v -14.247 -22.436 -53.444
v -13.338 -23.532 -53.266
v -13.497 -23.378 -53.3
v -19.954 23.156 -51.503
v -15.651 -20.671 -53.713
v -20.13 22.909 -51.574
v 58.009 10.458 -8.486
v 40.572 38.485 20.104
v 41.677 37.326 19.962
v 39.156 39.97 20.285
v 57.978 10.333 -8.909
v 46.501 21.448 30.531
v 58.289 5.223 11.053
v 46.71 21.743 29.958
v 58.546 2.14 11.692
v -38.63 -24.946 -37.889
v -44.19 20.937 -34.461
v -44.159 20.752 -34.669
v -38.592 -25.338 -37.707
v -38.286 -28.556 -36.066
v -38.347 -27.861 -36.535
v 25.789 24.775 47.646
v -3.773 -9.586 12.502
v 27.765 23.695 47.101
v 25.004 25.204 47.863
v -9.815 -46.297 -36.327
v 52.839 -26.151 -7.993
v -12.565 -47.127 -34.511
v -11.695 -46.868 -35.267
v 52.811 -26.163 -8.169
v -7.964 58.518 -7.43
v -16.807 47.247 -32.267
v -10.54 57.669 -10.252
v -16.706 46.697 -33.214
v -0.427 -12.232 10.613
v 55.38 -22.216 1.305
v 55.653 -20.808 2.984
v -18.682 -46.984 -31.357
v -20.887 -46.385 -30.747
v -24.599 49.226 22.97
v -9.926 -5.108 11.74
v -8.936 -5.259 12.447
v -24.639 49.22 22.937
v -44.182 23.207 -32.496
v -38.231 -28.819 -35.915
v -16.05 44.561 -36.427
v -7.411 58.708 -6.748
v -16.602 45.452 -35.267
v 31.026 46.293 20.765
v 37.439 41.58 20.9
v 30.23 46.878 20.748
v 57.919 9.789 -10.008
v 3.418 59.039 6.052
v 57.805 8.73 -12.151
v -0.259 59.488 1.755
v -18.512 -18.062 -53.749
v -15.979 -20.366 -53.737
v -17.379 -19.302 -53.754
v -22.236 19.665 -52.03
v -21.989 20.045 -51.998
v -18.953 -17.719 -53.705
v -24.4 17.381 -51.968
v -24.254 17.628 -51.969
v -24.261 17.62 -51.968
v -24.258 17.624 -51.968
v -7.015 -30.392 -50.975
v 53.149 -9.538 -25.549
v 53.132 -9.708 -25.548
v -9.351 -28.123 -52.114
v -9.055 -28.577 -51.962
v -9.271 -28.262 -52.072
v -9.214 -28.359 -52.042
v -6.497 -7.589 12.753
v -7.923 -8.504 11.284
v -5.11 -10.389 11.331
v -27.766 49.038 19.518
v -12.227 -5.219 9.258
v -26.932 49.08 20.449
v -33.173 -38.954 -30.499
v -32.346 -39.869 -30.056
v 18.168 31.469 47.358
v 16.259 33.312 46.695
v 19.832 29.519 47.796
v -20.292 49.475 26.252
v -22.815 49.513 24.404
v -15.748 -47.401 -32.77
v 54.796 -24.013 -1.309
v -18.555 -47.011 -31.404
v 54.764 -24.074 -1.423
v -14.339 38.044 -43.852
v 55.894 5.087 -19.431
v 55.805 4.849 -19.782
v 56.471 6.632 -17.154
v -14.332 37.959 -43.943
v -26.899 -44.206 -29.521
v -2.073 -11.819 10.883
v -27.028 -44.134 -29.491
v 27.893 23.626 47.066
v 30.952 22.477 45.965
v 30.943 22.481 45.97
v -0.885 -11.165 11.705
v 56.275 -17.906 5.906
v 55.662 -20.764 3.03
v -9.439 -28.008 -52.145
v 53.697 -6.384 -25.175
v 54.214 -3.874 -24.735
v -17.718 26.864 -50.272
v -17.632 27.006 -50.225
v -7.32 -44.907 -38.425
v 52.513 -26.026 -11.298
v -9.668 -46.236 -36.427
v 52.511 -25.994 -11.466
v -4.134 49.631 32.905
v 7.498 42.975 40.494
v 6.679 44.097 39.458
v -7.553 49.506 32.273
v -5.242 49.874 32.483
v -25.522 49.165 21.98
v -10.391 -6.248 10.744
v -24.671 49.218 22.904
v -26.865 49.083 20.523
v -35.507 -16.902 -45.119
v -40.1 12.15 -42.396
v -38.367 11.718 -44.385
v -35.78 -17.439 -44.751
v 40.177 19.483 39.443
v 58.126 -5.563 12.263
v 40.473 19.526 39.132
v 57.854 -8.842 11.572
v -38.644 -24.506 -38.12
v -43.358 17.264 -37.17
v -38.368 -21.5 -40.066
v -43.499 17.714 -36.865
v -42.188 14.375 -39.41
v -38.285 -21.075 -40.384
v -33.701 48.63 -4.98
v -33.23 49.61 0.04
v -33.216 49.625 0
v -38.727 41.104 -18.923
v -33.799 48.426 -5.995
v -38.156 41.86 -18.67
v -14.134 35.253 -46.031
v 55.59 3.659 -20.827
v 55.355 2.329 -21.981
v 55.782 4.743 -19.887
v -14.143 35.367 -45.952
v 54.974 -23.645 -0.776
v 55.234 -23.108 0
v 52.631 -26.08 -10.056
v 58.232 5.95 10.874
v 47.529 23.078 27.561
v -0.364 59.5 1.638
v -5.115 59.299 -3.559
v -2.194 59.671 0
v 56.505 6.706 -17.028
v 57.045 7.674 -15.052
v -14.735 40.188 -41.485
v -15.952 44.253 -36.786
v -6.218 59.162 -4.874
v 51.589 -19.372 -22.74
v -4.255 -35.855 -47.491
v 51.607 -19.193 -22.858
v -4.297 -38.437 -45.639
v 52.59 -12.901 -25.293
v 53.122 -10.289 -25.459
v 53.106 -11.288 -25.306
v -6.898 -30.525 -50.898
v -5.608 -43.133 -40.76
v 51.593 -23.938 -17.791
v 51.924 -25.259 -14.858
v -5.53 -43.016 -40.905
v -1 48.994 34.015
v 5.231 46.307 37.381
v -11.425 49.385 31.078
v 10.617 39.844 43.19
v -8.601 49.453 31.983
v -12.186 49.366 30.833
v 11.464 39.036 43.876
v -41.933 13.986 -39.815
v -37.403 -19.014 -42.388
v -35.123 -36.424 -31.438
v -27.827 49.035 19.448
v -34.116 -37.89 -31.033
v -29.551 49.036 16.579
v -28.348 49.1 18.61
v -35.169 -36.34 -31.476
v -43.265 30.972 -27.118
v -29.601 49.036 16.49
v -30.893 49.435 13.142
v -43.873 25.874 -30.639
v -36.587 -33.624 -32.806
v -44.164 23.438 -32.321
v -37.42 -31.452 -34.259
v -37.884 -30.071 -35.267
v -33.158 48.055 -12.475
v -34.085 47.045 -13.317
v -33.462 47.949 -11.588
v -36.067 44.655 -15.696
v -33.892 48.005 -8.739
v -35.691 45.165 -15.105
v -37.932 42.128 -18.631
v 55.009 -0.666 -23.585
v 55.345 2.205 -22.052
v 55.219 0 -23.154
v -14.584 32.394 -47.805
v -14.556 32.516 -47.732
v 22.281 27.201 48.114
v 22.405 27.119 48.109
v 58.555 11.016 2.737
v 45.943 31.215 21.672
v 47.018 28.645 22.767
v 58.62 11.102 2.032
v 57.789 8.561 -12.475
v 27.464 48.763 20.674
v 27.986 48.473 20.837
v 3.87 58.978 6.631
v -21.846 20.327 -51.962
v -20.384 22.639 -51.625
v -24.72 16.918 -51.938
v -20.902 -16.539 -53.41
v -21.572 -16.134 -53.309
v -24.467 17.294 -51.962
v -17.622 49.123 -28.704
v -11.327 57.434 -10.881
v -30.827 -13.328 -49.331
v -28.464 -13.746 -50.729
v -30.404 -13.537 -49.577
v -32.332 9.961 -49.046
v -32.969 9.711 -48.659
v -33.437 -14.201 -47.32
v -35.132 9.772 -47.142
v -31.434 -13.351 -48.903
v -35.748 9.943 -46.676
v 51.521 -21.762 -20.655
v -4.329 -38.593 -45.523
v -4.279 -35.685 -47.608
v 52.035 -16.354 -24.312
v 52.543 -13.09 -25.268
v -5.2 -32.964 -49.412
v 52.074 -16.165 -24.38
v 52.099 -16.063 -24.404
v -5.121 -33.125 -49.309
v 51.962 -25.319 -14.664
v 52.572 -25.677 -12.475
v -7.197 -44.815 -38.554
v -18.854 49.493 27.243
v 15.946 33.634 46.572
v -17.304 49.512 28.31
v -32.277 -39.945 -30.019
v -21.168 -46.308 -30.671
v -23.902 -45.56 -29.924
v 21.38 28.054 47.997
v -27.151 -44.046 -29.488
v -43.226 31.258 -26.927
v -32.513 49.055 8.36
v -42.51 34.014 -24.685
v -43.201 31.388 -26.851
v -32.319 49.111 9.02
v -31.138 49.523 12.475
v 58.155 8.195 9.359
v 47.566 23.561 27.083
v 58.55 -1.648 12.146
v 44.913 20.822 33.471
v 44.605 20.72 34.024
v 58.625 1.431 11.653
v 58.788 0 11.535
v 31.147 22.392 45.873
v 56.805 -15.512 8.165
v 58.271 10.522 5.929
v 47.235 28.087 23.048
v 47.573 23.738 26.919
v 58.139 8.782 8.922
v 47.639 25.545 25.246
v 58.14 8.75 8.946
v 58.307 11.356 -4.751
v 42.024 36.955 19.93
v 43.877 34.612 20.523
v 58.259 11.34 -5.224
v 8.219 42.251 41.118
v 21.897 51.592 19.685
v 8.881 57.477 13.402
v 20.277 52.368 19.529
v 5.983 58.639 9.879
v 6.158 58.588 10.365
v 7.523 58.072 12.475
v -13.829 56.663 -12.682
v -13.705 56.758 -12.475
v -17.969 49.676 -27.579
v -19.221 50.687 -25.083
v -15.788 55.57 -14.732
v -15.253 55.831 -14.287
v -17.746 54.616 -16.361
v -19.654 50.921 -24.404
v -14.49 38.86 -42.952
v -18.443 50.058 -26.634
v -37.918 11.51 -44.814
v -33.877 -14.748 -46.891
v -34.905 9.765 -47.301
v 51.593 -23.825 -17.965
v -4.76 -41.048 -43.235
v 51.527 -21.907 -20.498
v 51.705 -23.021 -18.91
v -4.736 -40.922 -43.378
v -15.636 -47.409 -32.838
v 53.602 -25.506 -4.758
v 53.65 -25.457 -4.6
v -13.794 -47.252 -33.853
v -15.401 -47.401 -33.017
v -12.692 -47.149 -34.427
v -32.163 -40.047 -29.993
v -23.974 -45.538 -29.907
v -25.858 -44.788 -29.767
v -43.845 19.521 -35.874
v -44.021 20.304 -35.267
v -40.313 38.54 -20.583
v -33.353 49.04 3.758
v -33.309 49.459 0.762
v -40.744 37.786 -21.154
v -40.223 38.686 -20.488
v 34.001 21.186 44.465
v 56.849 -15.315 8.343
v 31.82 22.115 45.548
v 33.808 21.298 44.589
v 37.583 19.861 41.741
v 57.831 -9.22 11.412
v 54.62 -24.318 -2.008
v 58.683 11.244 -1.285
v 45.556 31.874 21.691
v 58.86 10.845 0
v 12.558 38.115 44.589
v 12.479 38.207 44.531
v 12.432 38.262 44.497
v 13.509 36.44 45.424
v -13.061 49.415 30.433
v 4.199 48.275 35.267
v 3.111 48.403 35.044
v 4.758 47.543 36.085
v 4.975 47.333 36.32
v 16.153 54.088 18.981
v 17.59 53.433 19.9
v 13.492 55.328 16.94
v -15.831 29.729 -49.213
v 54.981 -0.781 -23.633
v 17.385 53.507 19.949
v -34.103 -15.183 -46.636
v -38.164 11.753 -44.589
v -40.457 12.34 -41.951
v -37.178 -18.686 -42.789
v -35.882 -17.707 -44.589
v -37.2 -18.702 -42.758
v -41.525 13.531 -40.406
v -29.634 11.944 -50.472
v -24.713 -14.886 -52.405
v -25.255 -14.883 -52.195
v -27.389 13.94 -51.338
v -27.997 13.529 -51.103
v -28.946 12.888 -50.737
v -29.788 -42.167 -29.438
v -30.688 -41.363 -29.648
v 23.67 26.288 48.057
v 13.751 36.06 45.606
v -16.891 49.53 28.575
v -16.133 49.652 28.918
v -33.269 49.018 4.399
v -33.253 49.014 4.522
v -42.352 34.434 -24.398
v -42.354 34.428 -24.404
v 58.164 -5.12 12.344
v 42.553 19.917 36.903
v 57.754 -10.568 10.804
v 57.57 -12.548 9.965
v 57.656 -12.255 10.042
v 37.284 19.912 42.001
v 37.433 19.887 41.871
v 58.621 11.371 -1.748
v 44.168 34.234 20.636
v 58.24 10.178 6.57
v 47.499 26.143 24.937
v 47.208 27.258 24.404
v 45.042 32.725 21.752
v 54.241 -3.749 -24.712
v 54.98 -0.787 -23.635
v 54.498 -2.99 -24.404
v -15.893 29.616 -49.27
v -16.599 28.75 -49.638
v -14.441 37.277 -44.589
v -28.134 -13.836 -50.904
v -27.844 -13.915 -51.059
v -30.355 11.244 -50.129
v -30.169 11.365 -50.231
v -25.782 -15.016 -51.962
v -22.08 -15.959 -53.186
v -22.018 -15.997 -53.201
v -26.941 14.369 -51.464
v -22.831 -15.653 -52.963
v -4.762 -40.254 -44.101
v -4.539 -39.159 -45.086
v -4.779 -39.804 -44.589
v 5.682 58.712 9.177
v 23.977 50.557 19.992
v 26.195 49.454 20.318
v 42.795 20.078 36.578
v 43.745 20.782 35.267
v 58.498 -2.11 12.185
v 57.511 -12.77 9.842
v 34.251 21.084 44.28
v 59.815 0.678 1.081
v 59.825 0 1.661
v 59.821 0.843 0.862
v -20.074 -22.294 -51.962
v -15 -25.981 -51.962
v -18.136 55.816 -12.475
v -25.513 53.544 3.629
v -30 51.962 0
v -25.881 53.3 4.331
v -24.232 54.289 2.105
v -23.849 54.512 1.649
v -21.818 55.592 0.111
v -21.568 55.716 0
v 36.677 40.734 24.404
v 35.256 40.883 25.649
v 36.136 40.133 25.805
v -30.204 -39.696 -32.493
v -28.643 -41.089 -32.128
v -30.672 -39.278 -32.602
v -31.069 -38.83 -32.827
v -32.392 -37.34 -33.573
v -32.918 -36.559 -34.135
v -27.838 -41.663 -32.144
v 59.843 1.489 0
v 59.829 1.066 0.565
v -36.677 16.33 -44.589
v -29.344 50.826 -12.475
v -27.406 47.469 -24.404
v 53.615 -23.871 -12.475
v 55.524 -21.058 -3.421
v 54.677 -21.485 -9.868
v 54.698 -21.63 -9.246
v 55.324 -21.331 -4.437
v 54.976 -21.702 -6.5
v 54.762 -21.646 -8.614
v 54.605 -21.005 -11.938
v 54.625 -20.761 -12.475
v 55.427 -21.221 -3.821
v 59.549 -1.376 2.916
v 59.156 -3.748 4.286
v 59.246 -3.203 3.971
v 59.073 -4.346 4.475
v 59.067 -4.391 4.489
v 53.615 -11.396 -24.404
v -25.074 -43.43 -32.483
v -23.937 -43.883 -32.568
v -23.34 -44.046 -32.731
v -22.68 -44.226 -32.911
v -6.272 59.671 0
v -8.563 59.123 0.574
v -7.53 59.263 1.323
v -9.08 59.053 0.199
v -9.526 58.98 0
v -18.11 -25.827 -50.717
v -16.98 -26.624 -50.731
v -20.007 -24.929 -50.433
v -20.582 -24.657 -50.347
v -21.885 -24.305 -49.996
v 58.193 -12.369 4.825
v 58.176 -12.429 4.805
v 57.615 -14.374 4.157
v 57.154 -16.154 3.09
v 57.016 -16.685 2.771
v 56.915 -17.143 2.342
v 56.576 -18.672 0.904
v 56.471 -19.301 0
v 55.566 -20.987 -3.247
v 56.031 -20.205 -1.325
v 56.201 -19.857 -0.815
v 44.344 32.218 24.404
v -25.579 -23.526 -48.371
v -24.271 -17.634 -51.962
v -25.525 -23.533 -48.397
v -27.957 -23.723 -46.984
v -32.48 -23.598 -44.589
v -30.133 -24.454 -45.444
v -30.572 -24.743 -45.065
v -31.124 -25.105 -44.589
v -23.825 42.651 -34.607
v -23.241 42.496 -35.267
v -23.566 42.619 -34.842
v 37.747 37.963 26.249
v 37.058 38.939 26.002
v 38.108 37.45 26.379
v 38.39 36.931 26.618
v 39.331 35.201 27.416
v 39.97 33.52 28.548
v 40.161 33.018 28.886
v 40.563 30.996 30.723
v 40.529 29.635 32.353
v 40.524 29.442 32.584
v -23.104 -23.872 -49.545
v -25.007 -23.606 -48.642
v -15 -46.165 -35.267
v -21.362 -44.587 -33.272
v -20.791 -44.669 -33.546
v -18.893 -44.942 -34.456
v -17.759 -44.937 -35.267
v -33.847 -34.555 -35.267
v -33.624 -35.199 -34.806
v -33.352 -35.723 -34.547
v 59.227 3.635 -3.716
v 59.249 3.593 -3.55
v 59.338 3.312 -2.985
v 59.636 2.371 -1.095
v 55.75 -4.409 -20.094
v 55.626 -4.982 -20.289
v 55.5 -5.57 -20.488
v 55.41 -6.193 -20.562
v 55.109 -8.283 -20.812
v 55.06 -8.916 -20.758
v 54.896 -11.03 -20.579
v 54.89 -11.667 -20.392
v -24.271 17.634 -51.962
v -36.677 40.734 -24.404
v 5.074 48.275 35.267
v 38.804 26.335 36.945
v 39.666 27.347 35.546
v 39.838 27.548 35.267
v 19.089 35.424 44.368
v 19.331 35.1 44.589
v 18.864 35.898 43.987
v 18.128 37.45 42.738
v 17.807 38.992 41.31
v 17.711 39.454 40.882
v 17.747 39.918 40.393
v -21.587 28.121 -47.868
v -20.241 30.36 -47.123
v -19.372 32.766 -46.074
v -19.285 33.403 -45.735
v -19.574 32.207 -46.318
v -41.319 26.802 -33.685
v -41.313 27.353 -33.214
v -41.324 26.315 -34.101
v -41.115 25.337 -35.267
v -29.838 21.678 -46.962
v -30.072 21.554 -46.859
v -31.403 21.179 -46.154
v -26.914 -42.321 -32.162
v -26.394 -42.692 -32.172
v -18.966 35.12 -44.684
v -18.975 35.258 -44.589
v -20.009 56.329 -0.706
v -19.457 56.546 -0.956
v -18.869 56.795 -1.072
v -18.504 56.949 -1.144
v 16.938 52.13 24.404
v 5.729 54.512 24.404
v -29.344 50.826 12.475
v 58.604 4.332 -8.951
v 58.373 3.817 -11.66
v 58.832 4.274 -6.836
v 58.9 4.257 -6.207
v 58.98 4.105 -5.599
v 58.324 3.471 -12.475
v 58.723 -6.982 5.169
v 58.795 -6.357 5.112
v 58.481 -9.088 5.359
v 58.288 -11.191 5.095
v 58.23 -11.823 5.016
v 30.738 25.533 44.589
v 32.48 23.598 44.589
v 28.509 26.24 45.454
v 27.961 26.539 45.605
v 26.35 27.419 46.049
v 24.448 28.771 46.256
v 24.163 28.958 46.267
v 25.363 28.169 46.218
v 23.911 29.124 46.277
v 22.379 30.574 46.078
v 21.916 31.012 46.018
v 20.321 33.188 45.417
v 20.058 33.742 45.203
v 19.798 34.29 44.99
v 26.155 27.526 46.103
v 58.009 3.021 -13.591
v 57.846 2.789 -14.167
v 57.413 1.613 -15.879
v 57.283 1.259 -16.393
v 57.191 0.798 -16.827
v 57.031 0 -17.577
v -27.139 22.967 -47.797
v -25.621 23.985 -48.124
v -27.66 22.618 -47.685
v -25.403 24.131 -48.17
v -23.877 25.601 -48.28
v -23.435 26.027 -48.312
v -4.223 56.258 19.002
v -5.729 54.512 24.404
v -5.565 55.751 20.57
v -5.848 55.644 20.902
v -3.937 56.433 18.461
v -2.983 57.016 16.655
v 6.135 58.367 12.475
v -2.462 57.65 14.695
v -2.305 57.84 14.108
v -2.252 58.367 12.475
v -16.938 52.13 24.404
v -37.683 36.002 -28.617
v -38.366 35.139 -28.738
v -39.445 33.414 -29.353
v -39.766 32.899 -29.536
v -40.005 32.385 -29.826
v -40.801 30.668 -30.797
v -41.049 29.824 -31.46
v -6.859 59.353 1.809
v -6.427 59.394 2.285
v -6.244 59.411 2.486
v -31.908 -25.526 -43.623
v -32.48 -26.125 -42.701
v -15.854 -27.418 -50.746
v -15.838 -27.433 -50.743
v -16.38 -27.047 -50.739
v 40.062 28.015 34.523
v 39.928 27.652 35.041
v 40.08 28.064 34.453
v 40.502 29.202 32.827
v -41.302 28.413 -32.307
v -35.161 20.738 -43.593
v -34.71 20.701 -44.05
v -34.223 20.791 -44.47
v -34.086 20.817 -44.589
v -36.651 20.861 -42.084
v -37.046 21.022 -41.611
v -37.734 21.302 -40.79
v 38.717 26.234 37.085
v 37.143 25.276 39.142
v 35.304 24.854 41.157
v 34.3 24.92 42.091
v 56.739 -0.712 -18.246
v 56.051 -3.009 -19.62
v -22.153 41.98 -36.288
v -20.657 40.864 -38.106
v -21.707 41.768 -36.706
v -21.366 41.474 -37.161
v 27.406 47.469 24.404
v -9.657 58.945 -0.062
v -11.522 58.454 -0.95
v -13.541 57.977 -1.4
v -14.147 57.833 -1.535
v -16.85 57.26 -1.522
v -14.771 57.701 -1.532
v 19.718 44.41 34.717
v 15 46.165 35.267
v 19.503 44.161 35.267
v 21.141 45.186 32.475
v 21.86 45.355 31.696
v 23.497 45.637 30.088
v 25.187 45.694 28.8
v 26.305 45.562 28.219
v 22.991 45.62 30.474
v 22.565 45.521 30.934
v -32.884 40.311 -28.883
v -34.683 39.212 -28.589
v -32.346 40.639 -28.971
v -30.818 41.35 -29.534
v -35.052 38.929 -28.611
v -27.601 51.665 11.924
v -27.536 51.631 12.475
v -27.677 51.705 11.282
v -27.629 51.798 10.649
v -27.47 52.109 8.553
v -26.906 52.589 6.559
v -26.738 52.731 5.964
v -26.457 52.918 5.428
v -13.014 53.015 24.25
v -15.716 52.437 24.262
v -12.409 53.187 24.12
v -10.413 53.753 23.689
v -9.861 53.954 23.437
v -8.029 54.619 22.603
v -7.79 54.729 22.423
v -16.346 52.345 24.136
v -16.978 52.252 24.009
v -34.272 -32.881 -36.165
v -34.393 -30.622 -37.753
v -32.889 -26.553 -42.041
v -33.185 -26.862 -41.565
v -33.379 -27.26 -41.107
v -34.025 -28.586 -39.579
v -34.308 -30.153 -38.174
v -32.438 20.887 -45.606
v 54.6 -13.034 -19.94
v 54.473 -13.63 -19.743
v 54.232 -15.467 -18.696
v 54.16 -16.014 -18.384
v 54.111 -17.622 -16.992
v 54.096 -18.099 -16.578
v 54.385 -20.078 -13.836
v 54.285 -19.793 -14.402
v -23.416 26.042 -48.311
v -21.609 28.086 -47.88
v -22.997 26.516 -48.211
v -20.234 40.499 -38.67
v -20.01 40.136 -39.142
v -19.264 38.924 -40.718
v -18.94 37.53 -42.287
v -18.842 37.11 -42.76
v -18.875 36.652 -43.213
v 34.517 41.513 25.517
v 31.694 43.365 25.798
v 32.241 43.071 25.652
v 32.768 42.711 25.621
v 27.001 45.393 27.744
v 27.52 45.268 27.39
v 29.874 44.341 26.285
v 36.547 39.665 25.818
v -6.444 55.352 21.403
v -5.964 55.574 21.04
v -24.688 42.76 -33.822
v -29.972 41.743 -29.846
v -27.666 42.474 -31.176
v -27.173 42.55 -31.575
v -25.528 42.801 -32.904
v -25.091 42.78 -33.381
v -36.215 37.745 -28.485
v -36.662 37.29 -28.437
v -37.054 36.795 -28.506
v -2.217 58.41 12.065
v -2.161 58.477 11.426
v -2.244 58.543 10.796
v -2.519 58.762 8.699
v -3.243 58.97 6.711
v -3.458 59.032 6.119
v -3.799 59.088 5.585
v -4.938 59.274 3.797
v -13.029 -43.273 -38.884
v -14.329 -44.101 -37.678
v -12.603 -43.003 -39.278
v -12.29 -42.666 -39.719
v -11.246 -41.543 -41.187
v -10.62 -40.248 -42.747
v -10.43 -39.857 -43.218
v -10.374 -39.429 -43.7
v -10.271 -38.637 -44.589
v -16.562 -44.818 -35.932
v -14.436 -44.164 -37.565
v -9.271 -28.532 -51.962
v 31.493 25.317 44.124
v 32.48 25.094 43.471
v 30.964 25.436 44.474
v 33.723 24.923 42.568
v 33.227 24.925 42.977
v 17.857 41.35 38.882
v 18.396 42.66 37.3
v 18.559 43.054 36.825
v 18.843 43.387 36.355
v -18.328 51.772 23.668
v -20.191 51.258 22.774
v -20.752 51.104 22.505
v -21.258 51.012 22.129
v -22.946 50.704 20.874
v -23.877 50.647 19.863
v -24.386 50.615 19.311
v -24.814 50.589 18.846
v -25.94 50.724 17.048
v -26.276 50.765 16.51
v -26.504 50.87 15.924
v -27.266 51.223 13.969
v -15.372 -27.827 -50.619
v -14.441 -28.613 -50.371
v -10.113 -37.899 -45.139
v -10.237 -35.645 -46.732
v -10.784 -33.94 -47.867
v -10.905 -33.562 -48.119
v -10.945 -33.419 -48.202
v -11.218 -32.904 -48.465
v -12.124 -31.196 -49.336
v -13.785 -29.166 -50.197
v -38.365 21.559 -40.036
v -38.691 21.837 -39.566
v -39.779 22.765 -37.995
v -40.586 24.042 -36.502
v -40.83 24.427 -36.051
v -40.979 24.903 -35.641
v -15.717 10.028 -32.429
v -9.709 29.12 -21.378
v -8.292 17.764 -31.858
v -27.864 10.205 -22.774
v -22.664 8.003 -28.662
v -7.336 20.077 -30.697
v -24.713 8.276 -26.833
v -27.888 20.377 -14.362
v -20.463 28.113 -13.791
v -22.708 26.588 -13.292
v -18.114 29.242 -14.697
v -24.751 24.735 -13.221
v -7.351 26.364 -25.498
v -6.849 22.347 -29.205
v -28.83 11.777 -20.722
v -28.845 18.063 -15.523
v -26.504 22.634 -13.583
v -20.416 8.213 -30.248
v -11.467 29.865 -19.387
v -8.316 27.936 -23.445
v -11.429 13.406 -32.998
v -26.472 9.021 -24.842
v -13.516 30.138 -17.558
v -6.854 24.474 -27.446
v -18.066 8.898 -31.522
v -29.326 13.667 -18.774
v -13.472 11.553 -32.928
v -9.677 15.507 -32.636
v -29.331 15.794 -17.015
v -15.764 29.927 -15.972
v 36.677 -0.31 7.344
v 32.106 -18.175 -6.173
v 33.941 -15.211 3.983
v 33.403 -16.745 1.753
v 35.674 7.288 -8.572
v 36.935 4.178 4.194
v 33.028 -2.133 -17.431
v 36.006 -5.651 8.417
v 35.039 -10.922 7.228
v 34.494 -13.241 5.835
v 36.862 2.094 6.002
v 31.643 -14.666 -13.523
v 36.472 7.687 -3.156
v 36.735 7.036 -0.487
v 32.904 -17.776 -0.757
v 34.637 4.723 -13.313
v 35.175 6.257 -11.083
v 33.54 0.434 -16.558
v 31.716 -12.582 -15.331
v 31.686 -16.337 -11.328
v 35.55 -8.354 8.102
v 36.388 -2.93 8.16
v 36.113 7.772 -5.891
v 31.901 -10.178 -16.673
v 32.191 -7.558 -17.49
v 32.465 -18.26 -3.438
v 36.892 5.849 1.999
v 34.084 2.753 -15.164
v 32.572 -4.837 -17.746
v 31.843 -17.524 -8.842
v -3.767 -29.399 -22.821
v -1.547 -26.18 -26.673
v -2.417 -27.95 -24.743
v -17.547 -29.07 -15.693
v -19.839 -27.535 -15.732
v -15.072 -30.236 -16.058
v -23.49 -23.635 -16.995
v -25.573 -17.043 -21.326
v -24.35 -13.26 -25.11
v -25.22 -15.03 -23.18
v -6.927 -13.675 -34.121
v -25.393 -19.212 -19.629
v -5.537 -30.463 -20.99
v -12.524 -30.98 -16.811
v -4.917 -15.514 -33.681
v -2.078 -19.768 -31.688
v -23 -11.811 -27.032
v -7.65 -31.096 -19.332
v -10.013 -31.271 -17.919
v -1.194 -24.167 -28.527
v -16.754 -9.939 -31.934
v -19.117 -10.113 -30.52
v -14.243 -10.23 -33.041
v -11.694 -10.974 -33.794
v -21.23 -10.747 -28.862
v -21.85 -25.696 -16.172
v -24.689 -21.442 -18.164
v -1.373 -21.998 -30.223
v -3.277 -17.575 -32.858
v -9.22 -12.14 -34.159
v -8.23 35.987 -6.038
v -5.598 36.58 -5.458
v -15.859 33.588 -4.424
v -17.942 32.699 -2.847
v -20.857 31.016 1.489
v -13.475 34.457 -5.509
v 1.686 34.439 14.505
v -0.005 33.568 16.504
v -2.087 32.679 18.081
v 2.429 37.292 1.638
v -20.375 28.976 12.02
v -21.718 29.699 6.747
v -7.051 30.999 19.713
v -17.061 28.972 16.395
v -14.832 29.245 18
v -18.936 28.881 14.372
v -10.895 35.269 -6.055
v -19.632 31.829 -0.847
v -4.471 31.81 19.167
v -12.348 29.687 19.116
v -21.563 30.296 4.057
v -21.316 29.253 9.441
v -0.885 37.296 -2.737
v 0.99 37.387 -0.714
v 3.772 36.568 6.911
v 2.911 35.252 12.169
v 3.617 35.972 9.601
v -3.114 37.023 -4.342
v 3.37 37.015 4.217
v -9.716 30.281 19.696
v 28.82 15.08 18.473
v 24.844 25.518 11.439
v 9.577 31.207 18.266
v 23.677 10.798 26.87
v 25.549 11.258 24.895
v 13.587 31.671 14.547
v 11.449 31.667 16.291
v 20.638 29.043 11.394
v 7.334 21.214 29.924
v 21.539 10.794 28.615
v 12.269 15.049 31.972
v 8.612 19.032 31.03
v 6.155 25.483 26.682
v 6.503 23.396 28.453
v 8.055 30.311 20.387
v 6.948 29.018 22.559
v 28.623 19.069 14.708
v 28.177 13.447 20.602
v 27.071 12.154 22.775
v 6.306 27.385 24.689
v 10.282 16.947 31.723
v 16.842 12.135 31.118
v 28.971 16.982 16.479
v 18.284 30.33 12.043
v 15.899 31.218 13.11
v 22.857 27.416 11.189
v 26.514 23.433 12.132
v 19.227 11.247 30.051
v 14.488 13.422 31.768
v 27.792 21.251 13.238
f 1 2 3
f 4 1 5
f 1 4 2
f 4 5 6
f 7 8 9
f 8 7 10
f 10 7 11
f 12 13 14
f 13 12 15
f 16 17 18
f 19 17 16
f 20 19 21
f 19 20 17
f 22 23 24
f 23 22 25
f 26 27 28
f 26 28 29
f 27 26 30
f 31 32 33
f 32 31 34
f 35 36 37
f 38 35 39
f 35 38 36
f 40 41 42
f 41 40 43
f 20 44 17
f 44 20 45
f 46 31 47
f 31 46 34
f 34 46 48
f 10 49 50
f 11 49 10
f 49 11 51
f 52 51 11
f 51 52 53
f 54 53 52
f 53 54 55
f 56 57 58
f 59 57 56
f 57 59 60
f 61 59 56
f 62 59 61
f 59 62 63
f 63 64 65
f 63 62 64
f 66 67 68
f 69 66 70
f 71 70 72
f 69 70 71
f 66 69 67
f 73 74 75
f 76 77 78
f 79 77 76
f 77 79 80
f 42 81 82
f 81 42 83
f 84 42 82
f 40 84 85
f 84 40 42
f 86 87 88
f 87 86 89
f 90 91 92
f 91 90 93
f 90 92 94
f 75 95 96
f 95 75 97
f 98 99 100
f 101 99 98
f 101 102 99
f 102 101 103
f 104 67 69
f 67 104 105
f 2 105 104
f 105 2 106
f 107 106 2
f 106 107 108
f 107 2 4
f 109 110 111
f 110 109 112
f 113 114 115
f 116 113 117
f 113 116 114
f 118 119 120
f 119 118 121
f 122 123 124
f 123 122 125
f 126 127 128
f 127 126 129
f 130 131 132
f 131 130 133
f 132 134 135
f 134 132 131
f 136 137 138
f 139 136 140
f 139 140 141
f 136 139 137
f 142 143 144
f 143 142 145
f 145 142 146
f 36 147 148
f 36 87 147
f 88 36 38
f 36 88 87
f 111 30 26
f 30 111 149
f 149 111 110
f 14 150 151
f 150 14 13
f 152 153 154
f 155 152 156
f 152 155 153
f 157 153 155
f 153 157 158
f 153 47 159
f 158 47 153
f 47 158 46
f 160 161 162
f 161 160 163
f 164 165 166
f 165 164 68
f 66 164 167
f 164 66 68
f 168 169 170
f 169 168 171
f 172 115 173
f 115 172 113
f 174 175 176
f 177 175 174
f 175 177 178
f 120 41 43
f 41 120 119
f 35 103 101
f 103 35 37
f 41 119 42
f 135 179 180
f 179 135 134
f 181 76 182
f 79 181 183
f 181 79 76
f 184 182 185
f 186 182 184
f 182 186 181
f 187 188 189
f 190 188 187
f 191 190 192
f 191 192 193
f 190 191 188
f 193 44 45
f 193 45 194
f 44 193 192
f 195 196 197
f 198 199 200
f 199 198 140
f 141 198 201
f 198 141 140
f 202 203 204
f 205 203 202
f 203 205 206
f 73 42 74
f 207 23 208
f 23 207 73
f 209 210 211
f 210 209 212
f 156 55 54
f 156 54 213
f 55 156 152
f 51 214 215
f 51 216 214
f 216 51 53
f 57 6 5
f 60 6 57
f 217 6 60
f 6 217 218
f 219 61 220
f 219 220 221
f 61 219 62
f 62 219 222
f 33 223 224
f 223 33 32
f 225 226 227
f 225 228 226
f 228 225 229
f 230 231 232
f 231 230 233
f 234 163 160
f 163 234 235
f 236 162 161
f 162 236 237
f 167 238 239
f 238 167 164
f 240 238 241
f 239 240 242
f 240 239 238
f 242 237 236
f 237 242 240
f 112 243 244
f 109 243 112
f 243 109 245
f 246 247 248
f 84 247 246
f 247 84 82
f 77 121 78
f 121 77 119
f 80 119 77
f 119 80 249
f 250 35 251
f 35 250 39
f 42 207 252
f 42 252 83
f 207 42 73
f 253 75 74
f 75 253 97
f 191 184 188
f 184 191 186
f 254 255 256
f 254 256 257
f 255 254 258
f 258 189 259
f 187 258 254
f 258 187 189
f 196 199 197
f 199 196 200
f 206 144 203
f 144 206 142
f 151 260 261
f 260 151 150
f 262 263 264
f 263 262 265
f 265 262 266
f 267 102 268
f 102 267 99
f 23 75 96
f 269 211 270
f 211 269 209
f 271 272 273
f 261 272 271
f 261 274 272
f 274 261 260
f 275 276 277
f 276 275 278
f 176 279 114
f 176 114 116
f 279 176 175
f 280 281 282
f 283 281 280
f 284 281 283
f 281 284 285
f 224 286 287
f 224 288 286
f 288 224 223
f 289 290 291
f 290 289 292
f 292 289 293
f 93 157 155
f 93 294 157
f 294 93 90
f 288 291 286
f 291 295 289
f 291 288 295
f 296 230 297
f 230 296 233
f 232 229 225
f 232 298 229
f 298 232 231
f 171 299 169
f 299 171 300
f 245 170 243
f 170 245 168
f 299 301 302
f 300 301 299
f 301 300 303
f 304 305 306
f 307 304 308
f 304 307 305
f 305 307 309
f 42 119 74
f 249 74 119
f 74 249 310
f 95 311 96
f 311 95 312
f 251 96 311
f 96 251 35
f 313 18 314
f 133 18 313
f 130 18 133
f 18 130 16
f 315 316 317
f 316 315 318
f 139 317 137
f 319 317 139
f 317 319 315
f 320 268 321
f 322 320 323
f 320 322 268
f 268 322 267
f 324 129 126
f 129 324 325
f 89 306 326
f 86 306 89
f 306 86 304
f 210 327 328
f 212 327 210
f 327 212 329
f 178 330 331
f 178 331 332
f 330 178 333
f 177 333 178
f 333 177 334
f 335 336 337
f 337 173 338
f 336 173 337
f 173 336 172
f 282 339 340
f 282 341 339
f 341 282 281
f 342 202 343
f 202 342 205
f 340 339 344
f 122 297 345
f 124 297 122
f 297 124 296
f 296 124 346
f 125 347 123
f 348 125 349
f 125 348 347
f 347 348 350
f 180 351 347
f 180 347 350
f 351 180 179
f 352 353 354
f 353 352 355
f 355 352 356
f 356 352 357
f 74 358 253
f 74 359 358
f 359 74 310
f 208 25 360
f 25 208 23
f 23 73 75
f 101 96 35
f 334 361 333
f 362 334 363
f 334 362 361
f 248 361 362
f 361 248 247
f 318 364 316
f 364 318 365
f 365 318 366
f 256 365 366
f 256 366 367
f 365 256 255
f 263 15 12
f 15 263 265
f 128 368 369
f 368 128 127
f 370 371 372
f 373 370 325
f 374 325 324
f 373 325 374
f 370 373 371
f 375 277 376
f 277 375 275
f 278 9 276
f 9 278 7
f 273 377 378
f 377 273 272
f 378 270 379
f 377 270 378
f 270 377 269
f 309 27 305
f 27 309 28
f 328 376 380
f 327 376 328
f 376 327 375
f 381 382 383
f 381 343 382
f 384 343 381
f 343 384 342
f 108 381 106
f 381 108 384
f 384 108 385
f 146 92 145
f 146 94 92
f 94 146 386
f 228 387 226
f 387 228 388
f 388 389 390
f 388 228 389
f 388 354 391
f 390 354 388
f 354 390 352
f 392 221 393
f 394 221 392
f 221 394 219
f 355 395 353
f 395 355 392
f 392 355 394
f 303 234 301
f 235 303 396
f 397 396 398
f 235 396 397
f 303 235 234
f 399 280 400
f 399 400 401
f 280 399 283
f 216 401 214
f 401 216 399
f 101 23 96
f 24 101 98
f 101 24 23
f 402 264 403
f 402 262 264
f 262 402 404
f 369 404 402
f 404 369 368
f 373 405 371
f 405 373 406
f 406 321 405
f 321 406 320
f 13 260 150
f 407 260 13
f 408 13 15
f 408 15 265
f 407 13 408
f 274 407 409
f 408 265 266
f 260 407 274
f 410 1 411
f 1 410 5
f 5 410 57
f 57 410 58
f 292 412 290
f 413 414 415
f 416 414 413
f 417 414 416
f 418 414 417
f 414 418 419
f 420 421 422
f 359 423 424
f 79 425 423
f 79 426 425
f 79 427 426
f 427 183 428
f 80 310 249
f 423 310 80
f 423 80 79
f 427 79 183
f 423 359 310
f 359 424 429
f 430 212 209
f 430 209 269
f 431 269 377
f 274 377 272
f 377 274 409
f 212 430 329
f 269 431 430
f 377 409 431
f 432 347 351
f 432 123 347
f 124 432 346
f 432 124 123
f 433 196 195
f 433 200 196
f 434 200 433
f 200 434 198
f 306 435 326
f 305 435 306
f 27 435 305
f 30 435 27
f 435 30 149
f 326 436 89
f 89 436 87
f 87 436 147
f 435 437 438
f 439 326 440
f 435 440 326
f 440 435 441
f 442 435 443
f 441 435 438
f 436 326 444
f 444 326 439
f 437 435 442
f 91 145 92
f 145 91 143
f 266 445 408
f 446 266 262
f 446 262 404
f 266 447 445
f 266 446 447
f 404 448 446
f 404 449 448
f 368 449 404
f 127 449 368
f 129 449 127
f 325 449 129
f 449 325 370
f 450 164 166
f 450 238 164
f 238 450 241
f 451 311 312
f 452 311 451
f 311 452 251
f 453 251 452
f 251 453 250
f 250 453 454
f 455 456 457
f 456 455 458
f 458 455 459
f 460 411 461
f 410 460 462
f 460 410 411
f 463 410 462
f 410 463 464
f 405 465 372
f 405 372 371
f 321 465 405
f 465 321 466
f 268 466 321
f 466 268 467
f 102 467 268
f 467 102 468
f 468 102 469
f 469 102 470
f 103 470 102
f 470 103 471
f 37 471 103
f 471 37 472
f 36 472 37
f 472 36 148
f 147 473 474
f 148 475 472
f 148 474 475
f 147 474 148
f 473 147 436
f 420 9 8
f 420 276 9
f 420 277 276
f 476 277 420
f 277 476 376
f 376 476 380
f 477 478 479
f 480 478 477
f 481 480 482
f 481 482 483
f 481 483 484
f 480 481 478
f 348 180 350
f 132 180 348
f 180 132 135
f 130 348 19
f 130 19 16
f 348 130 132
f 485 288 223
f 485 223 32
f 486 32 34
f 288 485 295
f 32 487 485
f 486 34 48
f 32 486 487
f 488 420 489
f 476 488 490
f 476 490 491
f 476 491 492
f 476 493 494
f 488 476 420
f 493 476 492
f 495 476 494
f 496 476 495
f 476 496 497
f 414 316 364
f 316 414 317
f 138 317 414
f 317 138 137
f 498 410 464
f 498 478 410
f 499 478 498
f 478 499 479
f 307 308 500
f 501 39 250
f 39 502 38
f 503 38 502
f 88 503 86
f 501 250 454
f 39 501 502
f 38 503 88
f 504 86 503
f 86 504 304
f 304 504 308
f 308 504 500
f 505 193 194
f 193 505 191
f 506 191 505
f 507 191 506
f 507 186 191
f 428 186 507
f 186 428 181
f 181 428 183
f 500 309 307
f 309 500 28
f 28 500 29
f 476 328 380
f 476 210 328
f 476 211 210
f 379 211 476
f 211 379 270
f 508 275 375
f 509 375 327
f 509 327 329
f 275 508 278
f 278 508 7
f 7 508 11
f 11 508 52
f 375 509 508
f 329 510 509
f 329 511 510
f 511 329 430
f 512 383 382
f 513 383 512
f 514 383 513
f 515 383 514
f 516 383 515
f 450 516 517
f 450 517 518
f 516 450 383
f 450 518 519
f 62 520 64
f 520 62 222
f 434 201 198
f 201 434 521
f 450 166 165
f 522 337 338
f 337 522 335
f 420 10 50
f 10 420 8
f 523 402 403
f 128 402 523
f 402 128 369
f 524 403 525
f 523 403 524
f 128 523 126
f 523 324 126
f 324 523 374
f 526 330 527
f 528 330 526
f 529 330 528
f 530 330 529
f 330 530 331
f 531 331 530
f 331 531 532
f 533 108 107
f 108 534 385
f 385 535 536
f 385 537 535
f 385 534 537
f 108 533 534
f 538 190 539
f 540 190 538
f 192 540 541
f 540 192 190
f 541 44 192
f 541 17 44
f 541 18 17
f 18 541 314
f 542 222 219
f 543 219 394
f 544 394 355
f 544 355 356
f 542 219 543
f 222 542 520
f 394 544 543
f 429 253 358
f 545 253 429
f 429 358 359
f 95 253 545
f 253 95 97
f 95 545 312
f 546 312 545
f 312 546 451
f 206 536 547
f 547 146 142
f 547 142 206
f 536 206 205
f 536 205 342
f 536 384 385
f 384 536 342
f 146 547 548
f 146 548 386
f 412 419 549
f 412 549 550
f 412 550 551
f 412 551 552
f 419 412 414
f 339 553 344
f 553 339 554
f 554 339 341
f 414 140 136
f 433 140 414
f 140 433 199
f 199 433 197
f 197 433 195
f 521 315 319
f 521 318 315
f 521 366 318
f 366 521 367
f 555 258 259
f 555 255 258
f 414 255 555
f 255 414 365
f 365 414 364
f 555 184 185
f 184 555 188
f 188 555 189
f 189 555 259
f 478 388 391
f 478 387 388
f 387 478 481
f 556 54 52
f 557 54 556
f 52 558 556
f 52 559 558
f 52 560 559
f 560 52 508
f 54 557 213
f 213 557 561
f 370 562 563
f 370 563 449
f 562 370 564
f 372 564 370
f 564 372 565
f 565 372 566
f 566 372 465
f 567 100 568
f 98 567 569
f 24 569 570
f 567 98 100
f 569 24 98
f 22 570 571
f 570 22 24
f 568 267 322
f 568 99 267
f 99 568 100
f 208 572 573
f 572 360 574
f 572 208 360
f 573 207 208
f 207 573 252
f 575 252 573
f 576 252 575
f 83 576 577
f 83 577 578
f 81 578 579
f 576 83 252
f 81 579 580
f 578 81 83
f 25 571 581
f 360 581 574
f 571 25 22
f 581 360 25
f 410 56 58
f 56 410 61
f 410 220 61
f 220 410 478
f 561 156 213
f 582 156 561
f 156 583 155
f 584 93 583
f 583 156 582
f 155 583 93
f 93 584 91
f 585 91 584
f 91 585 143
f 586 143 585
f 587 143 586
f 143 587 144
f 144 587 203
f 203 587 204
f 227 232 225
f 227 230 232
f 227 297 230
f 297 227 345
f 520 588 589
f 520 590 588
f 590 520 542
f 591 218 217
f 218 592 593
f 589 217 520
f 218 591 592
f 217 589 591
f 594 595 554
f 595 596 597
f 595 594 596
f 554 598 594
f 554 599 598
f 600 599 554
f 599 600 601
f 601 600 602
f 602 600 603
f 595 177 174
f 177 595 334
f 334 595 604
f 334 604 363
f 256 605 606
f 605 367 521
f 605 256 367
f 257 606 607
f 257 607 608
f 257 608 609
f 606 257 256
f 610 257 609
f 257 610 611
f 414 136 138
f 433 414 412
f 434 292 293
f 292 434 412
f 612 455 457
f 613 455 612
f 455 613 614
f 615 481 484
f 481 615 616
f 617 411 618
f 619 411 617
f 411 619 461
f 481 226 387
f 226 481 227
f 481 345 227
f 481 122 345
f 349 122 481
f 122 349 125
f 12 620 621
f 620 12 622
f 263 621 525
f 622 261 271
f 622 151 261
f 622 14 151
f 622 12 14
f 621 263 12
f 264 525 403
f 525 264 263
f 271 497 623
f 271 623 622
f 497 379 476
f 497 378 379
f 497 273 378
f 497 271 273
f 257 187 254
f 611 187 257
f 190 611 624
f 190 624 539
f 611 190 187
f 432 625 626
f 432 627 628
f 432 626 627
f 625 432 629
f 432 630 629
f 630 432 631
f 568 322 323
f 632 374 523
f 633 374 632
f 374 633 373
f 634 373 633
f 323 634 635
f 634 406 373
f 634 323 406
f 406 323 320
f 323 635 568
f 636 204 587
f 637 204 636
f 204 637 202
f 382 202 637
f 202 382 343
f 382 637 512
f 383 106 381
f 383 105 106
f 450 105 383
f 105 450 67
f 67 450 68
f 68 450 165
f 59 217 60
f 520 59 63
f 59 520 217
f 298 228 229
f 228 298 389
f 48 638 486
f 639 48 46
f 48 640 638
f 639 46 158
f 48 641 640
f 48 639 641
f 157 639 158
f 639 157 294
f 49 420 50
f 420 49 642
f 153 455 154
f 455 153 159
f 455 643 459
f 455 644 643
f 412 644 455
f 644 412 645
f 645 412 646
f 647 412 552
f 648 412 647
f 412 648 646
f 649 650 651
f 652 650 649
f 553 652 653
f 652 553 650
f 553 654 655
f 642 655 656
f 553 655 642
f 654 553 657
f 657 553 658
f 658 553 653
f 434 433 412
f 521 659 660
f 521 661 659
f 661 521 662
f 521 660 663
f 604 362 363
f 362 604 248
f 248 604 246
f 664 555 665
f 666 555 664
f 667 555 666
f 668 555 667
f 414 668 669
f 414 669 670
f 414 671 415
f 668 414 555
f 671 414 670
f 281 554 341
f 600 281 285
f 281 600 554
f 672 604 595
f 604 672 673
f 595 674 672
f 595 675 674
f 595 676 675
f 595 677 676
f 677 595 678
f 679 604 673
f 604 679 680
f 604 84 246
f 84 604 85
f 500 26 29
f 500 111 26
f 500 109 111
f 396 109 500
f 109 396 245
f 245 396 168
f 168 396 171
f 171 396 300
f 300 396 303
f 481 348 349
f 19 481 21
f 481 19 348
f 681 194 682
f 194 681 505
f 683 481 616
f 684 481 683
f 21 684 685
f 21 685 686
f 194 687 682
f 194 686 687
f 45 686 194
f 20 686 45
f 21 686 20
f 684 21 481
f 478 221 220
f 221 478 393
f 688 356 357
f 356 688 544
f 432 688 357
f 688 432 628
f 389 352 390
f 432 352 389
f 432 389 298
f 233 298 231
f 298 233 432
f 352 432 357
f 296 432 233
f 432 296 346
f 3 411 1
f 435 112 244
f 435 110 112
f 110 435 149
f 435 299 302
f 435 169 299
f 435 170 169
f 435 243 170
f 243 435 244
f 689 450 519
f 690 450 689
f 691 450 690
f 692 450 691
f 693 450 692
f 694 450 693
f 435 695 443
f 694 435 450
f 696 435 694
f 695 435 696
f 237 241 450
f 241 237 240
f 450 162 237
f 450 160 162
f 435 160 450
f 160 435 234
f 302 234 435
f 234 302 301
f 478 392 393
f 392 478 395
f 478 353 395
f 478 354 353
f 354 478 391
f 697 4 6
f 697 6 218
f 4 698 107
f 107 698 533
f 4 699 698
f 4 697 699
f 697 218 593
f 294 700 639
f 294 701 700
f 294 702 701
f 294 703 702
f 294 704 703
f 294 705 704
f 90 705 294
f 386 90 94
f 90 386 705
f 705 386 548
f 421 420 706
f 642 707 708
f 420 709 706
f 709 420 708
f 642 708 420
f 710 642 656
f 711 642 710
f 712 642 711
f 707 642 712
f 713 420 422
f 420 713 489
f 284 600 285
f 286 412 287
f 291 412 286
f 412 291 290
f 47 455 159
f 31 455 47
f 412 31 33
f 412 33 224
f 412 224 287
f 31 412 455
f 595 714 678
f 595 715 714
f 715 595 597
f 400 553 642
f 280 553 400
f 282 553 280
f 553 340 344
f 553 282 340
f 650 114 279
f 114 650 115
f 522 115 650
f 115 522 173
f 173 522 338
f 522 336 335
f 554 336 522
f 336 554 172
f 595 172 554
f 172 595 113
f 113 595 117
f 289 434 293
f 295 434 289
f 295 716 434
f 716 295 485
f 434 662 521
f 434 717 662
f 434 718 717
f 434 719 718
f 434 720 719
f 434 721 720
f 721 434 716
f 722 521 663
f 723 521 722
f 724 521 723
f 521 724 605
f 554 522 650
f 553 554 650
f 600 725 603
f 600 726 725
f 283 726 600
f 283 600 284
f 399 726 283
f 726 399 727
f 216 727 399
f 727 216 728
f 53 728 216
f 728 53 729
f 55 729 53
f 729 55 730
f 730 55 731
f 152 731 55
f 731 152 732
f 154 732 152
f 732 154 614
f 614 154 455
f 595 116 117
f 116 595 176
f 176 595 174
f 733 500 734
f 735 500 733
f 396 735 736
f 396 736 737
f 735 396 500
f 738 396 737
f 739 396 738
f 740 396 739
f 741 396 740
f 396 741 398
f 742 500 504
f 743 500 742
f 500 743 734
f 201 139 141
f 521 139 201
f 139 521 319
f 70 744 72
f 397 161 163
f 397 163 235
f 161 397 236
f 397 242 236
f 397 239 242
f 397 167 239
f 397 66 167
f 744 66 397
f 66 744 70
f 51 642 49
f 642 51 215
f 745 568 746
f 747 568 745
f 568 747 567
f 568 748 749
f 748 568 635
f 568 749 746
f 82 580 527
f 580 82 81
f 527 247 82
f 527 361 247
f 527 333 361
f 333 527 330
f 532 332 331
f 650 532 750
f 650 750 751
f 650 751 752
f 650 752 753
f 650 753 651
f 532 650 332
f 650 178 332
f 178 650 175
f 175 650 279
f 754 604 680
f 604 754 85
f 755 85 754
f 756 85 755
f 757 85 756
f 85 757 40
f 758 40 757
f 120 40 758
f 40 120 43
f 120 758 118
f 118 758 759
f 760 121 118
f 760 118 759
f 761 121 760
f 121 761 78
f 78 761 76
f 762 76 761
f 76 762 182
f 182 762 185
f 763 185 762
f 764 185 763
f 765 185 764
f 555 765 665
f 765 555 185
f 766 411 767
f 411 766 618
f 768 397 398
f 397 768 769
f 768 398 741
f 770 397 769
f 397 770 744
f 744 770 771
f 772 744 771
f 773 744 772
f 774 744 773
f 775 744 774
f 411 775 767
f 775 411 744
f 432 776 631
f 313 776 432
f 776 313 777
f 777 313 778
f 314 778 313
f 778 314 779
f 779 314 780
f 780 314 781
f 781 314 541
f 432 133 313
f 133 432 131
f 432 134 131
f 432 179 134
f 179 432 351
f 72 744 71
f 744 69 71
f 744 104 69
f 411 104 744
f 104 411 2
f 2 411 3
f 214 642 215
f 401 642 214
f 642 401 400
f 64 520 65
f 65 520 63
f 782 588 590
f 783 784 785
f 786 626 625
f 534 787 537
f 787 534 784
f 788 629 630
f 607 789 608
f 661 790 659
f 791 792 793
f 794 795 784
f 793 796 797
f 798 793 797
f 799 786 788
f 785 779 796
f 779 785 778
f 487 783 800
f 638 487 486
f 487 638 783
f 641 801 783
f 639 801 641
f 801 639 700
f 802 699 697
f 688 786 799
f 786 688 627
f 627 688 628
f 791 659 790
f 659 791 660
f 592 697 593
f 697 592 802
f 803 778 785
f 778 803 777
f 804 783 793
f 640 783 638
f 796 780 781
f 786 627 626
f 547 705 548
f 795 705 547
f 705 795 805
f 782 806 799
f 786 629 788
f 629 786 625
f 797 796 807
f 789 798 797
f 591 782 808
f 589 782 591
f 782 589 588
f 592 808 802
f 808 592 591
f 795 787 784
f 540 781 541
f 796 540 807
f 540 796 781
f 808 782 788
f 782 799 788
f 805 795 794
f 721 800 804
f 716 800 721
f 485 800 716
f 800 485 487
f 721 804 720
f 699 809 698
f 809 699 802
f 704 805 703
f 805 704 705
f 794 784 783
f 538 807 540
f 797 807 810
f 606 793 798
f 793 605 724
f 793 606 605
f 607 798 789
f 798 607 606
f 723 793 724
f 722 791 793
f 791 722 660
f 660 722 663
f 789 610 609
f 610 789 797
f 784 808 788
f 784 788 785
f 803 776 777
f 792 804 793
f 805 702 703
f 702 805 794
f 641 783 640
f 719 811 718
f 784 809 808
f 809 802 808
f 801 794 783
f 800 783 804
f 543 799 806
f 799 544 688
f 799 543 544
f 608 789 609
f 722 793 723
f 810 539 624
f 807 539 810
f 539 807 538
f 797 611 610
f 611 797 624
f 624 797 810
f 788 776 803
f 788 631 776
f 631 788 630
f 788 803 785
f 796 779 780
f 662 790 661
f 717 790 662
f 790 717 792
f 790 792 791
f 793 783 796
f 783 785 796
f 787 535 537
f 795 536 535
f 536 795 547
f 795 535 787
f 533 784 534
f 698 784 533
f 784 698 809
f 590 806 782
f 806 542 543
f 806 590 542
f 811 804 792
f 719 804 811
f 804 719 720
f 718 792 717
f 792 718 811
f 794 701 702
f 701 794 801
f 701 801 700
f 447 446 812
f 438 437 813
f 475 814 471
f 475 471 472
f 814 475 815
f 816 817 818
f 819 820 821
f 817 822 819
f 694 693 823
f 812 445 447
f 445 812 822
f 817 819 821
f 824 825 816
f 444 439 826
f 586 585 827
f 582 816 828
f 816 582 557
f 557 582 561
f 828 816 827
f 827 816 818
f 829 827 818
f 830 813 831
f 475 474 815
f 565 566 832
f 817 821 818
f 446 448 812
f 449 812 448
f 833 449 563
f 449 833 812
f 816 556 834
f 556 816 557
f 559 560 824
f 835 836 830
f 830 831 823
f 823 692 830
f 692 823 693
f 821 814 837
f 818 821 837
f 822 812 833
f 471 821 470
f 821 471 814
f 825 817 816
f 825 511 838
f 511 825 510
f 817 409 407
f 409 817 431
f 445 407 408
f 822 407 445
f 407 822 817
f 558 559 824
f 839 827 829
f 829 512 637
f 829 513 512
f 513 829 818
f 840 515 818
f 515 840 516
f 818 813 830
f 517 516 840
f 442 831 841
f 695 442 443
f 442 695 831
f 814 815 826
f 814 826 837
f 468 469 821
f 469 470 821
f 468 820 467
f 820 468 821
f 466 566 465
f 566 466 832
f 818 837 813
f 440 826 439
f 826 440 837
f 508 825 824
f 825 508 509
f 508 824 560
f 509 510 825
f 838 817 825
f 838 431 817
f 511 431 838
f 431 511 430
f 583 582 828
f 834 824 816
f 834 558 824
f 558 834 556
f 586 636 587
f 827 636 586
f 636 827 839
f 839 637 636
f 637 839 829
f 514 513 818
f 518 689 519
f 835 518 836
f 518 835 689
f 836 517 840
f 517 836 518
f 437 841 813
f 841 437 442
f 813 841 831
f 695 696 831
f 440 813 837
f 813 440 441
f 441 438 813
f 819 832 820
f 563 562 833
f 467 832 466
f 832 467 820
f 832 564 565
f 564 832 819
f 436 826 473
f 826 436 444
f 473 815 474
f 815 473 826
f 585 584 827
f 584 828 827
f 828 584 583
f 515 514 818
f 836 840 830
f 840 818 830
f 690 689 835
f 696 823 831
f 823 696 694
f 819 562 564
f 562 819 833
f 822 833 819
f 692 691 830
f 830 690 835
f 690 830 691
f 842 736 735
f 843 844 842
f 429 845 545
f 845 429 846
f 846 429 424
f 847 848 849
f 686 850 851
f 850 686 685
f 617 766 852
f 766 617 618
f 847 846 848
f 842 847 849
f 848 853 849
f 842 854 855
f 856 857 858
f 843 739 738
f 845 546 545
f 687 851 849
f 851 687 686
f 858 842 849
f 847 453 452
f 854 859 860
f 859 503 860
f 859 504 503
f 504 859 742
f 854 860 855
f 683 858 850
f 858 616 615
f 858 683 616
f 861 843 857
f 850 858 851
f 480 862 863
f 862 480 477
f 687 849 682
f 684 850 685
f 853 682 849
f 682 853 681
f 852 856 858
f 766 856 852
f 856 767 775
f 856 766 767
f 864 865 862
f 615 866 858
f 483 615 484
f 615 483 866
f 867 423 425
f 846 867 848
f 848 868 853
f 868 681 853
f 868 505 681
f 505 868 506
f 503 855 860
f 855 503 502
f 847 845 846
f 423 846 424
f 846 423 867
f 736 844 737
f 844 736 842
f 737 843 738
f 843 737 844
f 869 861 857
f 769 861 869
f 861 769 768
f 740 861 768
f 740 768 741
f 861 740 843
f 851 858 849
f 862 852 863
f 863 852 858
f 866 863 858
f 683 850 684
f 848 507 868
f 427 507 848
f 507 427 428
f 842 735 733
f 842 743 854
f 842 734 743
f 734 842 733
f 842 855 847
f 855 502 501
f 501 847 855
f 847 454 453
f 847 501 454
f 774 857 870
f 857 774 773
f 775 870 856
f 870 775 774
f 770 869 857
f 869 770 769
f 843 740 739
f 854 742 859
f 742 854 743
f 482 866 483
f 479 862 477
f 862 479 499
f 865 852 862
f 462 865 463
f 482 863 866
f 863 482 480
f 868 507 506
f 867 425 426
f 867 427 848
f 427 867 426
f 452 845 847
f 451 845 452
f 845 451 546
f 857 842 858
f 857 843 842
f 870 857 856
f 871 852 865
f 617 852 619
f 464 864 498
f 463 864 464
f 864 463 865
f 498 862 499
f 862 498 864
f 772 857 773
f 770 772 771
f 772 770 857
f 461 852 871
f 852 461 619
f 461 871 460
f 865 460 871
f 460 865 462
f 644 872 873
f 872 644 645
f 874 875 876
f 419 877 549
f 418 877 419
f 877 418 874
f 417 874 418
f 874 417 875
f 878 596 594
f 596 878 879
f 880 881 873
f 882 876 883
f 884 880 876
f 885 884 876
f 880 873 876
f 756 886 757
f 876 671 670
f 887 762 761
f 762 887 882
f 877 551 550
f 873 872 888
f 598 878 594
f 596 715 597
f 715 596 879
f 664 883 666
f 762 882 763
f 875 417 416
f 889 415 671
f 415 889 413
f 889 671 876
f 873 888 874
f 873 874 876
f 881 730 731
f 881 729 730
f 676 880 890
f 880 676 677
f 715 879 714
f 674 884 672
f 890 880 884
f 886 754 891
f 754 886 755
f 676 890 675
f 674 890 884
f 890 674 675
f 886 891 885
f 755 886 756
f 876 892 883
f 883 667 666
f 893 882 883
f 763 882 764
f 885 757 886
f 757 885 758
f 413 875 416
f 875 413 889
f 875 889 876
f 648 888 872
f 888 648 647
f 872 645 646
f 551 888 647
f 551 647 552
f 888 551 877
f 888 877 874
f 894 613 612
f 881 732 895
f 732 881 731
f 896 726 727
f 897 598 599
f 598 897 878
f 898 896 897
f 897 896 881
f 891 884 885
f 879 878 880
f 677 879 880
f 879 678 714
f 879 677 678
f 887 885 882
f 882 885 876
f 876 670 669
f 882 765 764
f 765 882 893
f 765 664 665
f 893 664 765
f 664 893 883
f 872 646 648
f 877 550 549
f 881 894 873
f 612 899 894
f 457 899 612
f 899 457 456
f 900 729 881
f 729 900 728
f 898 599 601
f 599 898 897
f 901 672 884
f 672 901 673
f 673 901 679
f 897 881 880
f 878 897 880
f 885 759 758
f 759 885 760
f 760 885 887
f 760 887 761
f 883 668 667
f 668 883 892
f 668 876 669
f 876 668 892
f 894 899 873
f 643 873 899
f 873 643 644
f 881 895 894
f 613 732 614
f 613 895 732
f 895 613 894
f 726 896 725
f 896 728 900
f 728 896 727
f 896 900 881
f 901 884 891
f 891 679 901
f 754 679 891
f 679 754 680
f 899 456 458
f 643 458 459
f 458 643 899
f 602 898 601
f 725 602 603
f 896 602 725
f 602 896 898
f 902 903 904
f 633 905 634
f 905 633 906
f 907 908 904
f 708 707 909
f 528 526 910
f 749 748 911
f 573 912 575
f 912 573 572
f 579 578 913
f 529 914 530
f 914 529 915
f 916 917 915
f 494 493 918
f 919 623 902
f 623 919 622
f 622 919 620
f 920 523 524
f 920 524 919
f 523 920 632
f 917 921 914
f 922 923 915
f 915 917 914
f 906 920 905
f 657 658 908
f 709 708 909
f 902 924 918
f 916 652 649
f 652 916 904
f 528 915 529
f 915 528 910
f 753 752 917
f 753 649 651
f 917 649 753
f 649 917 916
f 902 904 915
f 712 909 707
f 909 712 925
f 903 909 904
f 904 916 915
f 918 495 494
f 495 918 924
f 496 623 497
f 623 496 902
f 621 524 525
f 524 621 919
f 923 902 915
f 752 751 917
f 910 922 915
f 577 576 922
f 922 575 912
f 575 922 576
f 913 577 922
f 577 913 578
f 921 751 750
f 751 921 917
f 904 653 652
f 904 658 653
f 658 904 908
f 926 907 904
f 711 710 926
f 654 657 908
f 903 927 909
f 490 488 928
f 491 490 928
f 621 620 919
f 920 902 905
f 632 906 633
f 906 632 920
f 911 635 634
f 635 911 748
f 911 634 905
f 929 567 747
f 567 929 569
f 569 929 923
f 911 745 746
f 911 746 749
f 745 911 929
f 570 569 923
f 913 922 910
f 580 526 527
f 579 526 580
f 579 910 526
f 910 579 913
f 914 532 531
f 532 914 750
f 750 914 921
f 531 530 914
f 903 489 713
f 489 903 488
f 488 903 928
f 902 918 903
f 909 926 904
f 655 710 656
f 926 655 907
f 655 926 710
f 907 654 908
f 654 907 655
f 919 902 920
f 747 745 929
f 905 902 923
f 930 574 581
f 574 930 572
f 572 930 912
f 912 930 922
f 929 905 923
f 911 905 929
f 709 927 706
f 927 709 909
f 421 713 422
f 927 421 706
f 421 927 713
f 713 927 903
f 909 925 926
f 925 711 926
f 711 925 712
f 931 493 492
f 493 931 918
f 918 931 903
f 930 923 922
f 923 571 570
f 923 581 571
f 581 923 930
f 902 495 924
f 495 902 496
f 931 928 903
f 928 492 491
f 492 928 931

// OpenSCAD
difference() {
	intersection() {
		hull() {
			rotate(a = -121.8002487075, v = [-0.8264841997, 0.1980847523, 0.0000000000]) {
				rotate(a = -90.0000000000, v = [-0.6087614290, 0.7933533403, 0.0000000000]) {
					cylinder(h = 60, r = 16.2000000000);
				}
			}
			rotate(a = -121.8002487075, v = [-0.8264841997, 0.1980847523, 0.0000000000]) {
				rotate(a = -90.0000000000, v = [-0.3826834324, -0.9238795325, 0.0000000000]) {
					cylinder(h = 60, r = 16.2000000000);
				}
			}
			rotate(a = -121.8002487075, v = [-0.8264841997, 0.1980847523, 0.0000000000]) {
				rotate(a = -20.3482733305, v = [-0.1948712799, 0.2879902172, 0.0000000000]) {
					cylinder(h = 60, r = 16.2000000000);
				}
			}
			rotate(a = -121.8002487075, v = [-0.8264841997, 0.1980847523, 0.0000000000]) {
				rotate(a = -146.5585275075, v = [-0.1703523564, 0.5240940995, 0.0000000000]) {
					cylinder(h = 60, r = 16.2000000000);
				}
			}
			rotate(a = -121.8002487075, v = [-0.8264841997, 0.1980847523, 0.0000000000]) {
				rotate(a = -157.7736717199, v = [0.0665799897, -0.3723606073, 0.0000000000]) {
					cylinder(h = 60, r = 16.2000000000);
				}
			}
		}
		sphere(r = 60);
	}
	union() {
		rotate(a = -121.8002487075, v = [-0.8264841997, 0.1980847523, 0.0000000000]) {
			rotate(a = -90.0000000000, v = [-0.6087614290, 0.7933533403, 0.0000000000]) {
				translate(v = [0, 0, 35]) {
					cylinder(h = 100, r = 13.2000000000);
				}
			}
		}
		rotate(a = -121.8002487075, v = [-0.8264841997, 0.1980847523, 0.0000000000]) {
			rotate(a = -90.0000000000, v = [-0.3826834324, -0.9238795325, 0.0000000000]) {
				translate(v = [0, 0, 35]) {
					cylinder(h = 100, r = 13.2000000000);
				}
			}
		}
		rotate(a = -121.8002487075, v = [-0.8264841997, 0.1980847523, 0.0000000000]) {
			rotate(a = -20.3482733305, v = [-0.1948712799, 0.2879902172, 0.0000000000]) {
				translate(v = [0, 0, 35]) {
					cylinder(h = 100, r = 13.2000000000);
				}
			}
		}
		rotate(a = -121.8002487075, v = [-0.8264841997, 0.1980847523, 0.0000000000]) {
			rotate(a = -146.5585275075, v = [-0.1703523564, 0.5240940995, 0.0000000000]) {
				translate(v = [0, 0, 35]) {
					cylinder(h = 100, r = 13.2000000000);
				}
			}
		}
		rotate(a = -121.8002487075, v = [-0.8264841997, 0.1980847523, 0.0000000000]) {
			rotate(a = -157.7736717199, v = [0.0665799897, -0.3723606073, 0.0000000000]) {
				translate(v = [0, 0, 35]) {
					cylinder(h = 100, r = 13.2000000000);
				}
			}
		}
	}
}
